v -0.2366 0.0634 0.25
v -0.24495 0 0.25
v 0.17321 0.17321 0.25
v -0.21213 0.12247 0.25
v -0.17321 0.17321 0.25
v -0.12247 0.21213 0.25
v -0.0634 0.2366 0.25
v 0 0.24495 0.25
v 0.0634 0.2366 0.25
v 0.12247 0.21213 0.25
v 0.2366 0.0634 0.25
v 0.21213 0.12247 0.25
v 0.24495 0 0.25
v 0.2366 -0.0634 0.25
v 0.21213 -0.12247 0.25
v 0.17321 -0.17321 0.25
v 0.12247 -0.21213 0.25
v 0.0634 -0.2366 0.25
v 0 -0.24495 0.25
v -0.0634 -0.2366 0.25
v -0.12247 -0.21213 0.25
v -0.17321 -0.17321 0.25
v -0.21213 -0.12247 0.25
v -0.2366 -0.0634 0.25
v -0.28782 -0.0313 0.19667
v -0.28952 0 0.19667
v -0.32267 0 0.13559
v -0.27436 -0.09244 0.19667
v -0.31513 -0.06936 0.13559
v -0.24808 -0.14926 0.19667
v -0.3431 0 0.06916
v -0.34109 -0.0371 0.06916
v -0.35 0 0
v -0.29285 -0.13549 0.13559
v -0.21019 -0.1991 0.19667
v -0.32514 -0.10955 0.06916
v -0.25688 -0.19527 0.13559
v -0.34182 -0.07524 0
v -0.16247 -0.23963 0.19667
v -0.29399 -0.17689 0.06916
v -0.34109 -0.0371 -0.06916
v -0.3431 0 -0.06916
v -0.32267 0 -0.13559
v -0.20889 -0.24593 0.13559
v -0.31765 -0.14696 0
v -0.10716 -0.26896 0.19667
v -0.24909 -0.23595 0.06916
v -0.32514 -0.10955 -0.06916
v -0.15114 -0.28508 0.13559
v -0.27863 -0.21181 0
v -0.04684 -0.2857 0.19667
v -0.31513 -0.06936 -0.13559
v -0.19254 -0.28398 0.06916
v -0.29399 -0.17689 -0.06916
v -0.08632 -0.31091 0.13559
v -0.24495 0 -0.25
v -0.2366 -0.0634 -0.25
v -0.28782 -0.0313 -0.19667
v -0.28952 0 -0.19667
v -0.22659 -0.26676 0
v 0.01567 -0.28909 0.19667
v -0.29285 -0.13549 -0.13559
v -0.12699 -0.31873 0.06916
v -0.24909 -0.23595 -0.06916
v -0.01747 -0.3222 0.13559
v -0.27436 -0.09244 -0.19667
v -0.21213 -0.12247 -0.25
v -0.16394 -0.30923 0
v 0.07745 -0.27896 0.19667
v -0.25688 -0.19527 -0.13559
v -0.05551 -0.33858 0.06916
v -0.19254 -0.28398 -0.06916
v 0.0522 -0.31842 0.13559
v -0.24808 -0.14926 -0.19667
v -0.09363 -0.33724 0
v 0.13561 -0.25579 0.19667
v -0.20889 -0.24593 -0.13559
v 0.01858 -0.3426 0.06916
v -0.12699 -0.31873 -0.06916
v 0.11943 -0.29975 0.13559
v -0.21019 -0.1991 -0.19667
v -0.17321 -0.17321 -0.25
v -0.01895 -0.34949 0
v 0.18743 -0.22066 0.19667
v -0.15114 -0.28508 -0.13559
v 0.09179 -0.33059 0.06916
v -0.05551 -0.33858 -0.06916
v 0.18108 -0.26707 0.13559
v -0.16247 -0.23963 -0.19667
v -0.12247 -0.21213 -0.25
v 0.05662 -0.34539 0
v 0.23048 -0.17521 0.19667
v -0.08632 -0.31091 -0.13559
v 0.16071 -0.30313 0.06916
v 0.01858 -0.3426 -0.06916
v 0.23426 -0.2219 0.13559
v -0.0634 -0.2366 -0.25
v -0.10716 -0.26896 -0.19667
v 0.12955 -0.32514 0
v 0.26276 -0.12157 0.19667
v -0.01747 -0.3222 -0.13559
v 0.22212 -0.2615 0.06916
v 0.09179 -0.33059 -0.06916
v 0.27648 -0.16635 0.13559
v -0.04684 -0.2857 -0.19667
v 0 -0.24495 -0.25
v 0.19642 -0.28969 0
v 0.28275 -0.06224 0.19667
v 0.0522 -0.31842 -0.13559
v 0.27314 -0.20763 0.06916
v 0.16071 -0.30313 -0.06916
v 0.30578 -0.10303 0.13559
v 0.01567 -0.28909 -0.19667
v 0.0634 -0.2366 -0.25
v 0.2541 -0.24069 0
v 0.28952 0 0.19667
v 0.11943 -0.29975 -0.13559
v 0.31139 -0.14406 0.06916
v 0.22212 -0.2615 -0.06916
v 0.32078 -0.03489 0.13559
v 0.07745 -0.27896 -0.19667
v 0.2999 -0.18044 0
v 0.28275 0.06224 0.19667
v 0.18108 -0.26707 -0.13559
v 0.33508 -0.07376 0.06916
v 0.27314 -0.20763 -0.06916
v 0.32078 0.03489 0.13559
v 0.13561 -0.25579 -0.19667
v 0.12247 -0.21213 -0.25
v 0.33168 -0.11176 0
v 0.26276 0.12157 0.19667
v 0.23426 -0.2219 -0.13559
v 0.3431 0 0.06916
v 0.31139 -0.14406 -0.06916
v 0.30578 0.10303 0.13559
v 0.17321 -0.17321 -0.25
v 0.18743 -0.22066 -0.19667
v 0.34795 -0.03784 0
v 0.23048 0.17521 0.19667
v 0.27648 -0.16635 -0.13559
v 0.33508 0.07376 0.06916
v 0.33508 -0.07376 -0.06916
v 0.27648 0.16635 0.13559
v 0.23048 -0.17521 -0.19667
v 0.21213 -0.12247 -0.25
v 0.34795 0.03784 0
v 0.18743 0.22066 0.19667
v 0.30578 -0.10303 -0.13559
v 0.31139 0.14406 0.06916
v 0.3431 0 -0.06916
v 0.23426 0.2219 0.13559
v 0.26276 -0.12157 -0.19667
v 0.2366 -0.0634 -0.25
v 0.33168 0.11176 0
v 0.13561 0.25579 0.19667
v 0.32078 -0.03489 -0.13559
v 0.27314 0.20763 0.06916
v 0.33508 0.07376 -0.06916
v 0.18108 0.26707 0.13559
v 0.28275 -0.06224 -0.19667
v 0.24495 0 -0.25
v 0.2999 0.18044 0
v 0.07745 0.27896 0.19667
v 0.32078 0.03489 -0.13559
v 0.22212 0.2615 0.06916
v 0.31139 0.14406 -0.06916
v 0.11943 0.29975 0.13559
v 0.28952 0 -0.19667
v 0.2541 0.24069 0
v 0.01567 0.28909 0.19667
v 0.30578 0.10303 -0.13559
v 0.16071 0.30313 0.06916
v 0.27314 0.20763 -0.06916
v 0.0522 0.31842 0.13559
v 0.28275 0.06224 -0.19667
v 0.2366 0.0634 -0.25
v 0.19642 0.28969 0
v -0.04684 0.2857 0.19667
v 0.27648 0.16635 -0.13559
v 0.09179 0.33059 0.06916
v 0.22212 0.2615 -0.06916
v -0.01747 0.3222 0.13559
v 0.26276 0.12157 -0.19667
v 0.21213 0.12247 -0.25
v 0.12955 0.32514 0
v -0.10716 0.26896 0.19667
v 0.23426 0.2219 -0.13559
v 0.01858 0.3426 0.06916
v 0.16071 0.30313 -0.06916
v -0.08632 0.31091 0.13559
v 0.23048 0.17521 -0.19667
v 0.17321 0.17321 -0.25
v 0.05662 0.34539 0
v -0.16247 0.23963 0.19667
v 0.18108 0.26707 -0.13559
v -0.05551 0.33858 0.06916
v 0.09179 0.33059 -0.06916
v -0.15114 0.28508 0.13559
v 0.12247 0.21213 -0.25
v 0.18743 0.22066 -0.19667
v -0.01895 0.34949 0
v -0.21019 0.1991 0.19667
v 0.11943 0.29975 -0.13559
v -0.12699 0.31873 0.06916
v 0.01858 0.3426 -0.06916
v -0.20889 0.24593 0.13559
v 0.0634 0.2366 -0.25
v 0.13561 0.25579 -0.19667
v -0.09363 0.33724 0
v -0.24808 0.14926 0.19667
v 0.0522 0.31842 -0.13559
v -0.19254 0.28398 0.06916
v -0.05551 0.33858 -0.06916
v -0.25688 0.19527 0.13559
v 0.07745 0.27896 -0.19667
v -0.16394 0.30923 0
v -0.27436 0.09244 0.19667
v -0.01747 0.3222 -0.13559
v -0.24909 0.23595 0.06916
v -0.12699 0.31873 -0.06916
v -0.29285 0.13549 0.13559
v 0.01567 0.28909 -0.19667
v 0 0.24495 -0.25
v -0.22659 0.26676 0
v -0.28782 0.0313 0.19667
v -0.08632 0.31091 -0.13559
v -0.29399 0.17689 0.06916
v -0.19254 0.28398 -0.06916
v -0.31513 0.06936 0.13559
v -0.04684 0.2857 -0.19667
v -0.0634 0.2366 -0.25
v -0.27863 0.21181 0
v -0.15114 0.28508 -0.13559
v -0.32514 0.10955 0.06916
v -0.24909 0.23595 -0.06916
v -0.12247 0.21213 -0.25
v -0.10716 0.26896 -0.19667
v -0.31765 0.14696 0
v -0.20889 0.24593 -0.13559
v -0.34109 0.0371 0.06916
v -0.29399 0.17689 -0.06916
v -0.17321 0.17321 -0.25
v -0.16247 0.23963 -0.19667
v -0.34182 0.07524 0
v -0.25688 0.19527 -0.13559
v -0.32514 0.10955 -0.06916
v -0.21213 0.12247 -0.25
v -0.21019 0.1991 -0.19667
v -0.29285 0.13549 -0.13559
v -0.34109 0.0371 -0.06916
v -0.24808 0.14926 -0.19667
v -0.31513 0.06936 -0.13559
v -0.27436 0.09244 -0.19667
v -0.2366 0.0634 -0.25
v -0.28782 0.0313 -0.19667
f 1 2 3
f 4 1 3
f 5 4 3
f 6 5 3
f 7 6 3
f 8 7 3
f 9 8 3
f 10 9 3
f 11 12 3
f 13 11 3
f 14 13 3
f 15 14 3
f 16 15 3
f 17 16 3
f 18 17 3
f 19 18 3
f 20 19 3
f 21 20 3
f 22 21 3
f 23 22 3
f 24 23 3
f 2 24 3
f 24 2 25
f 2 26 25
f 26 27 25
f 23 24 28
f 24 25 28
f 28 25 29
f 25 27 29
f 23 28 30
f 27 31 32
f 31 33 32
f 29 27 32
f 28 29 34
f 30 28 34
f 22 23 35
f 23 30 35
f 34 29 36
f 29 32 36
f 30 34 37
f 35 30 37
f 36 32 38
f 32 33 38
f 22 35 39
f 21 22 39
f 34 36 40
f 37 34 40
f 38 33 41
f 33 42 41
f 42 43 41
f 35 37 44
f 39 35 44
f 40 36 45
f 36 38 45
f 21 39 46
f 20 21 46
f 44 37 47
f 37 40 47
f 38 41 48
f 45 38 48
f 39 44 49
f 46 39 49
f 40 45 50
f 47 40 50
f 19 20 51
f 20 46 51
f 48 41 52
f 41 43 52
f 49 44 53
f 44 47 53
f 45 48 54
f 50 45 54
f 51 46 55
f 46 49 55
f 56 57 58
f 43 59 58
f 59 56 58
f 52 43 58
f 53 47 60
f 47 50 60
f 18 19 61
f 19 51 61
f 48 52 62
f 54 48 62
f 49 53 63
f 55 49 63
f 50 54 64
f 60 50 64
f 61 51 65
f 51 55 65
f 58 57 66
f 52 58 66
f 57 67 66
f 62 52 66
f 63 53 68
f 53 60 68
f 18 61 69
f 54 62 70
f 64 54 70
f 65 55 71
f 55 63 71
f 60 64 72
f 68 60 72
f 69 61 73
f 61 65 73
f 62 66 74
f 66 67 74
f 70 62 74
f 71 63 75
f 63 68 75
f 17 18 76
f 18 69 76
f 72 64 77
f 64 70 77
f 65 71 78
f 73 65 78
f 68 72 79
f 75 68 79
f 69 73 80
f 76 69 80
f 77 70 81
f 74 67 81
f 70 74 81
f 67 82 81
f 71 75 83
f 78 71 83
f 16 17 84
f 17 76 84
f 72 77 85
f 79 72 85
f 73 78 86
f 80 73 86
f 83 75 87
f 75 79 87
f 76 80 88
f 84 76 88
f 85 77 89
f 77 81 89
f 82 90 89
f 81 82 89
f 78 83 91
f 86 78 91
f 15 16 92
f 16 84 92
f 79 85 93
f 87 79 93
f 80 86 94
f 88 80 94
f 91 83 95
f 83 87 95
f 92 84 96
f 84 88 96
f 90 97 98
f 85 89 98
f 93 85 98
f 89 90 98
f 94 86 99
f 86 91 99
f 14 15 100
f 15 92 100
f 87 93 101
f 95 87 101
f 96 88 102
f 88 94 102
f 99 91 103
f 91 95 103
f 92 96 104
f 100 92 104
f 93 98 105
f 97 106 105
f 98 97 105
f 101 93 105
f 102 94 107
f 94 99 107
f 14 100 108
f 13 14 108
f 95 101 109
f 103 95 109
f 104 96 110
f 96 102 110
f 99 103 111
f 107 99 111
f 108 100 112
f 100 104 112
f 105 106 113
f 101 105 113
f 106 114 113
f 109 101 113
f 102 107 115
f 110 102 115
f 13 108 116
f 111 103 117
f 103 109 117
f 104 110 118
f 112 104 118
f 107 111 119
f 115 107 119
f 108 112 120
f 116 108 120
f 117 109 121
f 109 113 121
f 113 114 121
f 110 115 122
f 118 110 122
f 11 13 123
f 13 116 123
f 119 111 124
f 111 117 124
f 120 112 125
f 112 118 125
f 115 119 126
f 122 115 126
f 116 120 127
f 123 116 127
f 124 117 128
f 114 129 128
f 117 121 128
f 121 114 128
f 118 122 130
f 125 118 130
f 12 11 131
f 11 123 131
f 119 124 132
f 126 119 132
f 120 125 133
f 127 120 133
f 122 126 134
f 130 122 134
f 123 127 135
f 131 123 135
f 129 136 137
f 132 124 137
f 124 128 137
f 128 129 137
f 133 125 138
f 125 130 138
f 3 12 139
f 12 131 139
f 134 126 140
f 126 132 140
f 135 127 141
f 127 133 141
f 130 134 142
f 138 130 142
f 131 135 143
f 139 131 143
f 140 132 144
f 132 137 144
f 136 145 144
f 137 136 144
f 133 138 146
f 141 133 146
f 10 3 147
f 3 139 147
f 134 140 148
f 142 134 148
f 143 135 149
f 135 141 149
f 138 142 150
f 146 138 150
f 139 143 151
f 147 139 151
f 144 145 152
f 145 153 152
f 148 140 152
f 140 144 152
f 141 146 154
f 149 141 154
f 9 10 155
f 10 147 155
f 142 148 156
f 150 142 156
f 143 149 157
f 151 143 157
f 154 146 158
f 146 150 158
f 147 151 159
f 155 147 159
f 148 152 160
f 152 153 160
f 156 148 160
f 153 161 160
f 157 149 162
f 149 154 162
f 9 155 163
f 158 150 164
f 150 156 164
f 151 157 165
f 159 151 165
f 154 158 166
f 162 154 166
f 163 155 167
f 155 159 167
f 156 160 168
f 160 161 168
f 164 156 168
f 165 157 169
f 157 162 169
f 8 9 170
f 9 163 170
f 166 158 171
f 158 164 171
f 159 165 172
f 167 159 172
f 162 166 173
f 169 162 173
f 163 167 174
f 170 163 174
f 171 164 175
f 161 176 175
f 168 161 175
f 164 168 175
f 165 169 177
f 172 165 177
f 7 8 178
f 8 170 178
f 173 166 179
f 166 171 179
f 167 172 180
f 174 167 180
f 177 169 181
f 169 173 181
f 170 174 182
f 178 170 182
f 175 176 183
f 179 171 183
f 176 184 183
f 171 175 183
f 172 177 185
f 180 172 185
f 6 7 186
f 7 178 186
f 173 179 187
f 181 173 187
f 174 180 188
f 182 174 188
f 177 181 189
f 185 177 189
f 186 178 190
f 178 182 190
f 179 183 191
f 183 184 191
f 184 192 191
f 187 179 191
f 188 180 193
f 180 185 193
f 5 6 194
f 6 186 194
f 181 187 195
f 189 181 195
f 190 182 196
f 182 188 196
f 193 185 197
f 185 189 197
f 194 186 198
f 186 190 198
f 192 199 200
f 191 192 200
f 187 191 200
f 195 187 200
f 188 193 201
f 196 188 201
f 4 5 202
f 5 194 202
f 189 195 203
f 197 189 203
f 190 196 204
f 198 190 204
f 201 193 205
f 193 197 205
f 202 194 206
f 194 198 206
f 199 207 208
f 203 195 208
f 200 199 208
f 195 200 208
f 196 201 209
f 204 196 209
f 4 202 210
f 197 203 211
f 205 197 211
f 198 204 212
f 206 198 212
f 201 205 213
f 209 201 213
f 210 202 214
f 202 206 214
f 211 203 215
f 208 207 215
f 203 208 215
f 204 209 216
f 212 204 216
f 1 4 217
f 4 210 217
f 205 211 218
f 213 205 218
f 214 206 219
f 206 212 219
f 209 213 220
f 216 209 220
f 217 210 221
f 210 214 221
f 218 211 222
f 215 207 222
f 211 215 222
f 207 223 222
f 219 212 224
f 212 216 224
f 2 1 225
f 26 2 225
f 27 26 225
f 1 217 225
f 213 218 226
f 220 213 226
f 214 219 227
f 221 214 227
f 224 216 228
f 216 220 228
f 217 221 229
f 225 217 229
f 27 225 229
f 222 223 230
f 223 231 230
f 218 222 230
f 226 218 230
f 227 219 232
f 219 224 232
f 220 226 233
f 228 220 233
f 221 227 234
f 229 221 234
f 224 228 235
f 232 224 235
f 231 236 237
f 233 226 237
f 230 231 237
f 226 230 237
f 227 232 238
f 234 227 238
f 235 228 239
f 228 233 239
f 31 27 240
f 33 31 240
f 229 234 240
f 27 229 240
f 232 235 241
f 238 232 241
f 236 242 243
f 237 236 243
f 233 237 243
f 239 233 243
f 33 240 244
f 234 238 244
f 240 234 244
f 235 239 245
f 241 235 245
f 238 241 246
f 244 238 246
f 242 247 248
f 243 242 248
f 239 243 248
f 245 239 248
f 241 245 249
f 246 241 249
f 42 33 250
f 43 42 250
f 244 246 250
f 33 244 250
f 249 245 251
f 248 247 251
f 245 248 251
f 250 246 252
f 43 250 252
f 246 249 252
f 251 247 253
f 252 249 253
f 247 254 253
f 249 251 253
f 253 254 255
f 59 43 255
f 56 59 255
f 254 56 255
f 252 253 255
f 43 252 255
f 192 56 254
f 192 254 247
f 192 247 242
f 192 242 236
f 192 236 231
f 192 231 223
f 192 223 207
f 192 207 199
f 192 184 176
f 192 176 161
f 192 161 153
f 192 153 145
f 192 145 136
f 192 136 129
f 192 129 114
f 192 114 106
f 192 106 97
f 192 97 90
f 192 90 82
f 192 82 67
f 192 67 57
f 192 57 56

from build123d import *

# Parameters (mm, degrees)
SKETCH2_W          = 0.2
SKETCH2_H          = 1.233474408
CUT_EXTRUDE1_DEPTH = 5


with BuildPart() as part:
    # Sketch1 → Revolve3 (revolve)
    with BuildSketch(Plane(origin=(0, 0, 0), x_dir=(1, 0, 0), z_dir=(0, 1, 0))):
        with BuildLine():
            Line((0, 0.35), (0, -0.35))
            ThreePointArc((0, -0.35), (-0.35, 0), (0, 0.35))
        make_face()
    revolve(axis=Axis((0, 0, -0.35), (0, 0, 1)))

    # Sketch2 → Cut-Extrude1 (cut, symmetric)
    with BuildSketch(Plane(origin=(0, 0, 0), x_dir=(0, 0, -1), z_dir=(1, 0, 0))):
        with Locations((0.35, -0.006283266)):
            Rectangle(SKETCH2_W, SKETCH2_H)
    cut_extrude1 = extrude(amount=CUT_EXTRUDE1_DEPTH, both=True, mode=Mode.SUBTRACT)

    # Mirror1: Cut-Extrude1 across plane
    add(cut_extrude1.mirror(Plane.XY), mode=Mode.SUBTRACT)


solid = part.part
